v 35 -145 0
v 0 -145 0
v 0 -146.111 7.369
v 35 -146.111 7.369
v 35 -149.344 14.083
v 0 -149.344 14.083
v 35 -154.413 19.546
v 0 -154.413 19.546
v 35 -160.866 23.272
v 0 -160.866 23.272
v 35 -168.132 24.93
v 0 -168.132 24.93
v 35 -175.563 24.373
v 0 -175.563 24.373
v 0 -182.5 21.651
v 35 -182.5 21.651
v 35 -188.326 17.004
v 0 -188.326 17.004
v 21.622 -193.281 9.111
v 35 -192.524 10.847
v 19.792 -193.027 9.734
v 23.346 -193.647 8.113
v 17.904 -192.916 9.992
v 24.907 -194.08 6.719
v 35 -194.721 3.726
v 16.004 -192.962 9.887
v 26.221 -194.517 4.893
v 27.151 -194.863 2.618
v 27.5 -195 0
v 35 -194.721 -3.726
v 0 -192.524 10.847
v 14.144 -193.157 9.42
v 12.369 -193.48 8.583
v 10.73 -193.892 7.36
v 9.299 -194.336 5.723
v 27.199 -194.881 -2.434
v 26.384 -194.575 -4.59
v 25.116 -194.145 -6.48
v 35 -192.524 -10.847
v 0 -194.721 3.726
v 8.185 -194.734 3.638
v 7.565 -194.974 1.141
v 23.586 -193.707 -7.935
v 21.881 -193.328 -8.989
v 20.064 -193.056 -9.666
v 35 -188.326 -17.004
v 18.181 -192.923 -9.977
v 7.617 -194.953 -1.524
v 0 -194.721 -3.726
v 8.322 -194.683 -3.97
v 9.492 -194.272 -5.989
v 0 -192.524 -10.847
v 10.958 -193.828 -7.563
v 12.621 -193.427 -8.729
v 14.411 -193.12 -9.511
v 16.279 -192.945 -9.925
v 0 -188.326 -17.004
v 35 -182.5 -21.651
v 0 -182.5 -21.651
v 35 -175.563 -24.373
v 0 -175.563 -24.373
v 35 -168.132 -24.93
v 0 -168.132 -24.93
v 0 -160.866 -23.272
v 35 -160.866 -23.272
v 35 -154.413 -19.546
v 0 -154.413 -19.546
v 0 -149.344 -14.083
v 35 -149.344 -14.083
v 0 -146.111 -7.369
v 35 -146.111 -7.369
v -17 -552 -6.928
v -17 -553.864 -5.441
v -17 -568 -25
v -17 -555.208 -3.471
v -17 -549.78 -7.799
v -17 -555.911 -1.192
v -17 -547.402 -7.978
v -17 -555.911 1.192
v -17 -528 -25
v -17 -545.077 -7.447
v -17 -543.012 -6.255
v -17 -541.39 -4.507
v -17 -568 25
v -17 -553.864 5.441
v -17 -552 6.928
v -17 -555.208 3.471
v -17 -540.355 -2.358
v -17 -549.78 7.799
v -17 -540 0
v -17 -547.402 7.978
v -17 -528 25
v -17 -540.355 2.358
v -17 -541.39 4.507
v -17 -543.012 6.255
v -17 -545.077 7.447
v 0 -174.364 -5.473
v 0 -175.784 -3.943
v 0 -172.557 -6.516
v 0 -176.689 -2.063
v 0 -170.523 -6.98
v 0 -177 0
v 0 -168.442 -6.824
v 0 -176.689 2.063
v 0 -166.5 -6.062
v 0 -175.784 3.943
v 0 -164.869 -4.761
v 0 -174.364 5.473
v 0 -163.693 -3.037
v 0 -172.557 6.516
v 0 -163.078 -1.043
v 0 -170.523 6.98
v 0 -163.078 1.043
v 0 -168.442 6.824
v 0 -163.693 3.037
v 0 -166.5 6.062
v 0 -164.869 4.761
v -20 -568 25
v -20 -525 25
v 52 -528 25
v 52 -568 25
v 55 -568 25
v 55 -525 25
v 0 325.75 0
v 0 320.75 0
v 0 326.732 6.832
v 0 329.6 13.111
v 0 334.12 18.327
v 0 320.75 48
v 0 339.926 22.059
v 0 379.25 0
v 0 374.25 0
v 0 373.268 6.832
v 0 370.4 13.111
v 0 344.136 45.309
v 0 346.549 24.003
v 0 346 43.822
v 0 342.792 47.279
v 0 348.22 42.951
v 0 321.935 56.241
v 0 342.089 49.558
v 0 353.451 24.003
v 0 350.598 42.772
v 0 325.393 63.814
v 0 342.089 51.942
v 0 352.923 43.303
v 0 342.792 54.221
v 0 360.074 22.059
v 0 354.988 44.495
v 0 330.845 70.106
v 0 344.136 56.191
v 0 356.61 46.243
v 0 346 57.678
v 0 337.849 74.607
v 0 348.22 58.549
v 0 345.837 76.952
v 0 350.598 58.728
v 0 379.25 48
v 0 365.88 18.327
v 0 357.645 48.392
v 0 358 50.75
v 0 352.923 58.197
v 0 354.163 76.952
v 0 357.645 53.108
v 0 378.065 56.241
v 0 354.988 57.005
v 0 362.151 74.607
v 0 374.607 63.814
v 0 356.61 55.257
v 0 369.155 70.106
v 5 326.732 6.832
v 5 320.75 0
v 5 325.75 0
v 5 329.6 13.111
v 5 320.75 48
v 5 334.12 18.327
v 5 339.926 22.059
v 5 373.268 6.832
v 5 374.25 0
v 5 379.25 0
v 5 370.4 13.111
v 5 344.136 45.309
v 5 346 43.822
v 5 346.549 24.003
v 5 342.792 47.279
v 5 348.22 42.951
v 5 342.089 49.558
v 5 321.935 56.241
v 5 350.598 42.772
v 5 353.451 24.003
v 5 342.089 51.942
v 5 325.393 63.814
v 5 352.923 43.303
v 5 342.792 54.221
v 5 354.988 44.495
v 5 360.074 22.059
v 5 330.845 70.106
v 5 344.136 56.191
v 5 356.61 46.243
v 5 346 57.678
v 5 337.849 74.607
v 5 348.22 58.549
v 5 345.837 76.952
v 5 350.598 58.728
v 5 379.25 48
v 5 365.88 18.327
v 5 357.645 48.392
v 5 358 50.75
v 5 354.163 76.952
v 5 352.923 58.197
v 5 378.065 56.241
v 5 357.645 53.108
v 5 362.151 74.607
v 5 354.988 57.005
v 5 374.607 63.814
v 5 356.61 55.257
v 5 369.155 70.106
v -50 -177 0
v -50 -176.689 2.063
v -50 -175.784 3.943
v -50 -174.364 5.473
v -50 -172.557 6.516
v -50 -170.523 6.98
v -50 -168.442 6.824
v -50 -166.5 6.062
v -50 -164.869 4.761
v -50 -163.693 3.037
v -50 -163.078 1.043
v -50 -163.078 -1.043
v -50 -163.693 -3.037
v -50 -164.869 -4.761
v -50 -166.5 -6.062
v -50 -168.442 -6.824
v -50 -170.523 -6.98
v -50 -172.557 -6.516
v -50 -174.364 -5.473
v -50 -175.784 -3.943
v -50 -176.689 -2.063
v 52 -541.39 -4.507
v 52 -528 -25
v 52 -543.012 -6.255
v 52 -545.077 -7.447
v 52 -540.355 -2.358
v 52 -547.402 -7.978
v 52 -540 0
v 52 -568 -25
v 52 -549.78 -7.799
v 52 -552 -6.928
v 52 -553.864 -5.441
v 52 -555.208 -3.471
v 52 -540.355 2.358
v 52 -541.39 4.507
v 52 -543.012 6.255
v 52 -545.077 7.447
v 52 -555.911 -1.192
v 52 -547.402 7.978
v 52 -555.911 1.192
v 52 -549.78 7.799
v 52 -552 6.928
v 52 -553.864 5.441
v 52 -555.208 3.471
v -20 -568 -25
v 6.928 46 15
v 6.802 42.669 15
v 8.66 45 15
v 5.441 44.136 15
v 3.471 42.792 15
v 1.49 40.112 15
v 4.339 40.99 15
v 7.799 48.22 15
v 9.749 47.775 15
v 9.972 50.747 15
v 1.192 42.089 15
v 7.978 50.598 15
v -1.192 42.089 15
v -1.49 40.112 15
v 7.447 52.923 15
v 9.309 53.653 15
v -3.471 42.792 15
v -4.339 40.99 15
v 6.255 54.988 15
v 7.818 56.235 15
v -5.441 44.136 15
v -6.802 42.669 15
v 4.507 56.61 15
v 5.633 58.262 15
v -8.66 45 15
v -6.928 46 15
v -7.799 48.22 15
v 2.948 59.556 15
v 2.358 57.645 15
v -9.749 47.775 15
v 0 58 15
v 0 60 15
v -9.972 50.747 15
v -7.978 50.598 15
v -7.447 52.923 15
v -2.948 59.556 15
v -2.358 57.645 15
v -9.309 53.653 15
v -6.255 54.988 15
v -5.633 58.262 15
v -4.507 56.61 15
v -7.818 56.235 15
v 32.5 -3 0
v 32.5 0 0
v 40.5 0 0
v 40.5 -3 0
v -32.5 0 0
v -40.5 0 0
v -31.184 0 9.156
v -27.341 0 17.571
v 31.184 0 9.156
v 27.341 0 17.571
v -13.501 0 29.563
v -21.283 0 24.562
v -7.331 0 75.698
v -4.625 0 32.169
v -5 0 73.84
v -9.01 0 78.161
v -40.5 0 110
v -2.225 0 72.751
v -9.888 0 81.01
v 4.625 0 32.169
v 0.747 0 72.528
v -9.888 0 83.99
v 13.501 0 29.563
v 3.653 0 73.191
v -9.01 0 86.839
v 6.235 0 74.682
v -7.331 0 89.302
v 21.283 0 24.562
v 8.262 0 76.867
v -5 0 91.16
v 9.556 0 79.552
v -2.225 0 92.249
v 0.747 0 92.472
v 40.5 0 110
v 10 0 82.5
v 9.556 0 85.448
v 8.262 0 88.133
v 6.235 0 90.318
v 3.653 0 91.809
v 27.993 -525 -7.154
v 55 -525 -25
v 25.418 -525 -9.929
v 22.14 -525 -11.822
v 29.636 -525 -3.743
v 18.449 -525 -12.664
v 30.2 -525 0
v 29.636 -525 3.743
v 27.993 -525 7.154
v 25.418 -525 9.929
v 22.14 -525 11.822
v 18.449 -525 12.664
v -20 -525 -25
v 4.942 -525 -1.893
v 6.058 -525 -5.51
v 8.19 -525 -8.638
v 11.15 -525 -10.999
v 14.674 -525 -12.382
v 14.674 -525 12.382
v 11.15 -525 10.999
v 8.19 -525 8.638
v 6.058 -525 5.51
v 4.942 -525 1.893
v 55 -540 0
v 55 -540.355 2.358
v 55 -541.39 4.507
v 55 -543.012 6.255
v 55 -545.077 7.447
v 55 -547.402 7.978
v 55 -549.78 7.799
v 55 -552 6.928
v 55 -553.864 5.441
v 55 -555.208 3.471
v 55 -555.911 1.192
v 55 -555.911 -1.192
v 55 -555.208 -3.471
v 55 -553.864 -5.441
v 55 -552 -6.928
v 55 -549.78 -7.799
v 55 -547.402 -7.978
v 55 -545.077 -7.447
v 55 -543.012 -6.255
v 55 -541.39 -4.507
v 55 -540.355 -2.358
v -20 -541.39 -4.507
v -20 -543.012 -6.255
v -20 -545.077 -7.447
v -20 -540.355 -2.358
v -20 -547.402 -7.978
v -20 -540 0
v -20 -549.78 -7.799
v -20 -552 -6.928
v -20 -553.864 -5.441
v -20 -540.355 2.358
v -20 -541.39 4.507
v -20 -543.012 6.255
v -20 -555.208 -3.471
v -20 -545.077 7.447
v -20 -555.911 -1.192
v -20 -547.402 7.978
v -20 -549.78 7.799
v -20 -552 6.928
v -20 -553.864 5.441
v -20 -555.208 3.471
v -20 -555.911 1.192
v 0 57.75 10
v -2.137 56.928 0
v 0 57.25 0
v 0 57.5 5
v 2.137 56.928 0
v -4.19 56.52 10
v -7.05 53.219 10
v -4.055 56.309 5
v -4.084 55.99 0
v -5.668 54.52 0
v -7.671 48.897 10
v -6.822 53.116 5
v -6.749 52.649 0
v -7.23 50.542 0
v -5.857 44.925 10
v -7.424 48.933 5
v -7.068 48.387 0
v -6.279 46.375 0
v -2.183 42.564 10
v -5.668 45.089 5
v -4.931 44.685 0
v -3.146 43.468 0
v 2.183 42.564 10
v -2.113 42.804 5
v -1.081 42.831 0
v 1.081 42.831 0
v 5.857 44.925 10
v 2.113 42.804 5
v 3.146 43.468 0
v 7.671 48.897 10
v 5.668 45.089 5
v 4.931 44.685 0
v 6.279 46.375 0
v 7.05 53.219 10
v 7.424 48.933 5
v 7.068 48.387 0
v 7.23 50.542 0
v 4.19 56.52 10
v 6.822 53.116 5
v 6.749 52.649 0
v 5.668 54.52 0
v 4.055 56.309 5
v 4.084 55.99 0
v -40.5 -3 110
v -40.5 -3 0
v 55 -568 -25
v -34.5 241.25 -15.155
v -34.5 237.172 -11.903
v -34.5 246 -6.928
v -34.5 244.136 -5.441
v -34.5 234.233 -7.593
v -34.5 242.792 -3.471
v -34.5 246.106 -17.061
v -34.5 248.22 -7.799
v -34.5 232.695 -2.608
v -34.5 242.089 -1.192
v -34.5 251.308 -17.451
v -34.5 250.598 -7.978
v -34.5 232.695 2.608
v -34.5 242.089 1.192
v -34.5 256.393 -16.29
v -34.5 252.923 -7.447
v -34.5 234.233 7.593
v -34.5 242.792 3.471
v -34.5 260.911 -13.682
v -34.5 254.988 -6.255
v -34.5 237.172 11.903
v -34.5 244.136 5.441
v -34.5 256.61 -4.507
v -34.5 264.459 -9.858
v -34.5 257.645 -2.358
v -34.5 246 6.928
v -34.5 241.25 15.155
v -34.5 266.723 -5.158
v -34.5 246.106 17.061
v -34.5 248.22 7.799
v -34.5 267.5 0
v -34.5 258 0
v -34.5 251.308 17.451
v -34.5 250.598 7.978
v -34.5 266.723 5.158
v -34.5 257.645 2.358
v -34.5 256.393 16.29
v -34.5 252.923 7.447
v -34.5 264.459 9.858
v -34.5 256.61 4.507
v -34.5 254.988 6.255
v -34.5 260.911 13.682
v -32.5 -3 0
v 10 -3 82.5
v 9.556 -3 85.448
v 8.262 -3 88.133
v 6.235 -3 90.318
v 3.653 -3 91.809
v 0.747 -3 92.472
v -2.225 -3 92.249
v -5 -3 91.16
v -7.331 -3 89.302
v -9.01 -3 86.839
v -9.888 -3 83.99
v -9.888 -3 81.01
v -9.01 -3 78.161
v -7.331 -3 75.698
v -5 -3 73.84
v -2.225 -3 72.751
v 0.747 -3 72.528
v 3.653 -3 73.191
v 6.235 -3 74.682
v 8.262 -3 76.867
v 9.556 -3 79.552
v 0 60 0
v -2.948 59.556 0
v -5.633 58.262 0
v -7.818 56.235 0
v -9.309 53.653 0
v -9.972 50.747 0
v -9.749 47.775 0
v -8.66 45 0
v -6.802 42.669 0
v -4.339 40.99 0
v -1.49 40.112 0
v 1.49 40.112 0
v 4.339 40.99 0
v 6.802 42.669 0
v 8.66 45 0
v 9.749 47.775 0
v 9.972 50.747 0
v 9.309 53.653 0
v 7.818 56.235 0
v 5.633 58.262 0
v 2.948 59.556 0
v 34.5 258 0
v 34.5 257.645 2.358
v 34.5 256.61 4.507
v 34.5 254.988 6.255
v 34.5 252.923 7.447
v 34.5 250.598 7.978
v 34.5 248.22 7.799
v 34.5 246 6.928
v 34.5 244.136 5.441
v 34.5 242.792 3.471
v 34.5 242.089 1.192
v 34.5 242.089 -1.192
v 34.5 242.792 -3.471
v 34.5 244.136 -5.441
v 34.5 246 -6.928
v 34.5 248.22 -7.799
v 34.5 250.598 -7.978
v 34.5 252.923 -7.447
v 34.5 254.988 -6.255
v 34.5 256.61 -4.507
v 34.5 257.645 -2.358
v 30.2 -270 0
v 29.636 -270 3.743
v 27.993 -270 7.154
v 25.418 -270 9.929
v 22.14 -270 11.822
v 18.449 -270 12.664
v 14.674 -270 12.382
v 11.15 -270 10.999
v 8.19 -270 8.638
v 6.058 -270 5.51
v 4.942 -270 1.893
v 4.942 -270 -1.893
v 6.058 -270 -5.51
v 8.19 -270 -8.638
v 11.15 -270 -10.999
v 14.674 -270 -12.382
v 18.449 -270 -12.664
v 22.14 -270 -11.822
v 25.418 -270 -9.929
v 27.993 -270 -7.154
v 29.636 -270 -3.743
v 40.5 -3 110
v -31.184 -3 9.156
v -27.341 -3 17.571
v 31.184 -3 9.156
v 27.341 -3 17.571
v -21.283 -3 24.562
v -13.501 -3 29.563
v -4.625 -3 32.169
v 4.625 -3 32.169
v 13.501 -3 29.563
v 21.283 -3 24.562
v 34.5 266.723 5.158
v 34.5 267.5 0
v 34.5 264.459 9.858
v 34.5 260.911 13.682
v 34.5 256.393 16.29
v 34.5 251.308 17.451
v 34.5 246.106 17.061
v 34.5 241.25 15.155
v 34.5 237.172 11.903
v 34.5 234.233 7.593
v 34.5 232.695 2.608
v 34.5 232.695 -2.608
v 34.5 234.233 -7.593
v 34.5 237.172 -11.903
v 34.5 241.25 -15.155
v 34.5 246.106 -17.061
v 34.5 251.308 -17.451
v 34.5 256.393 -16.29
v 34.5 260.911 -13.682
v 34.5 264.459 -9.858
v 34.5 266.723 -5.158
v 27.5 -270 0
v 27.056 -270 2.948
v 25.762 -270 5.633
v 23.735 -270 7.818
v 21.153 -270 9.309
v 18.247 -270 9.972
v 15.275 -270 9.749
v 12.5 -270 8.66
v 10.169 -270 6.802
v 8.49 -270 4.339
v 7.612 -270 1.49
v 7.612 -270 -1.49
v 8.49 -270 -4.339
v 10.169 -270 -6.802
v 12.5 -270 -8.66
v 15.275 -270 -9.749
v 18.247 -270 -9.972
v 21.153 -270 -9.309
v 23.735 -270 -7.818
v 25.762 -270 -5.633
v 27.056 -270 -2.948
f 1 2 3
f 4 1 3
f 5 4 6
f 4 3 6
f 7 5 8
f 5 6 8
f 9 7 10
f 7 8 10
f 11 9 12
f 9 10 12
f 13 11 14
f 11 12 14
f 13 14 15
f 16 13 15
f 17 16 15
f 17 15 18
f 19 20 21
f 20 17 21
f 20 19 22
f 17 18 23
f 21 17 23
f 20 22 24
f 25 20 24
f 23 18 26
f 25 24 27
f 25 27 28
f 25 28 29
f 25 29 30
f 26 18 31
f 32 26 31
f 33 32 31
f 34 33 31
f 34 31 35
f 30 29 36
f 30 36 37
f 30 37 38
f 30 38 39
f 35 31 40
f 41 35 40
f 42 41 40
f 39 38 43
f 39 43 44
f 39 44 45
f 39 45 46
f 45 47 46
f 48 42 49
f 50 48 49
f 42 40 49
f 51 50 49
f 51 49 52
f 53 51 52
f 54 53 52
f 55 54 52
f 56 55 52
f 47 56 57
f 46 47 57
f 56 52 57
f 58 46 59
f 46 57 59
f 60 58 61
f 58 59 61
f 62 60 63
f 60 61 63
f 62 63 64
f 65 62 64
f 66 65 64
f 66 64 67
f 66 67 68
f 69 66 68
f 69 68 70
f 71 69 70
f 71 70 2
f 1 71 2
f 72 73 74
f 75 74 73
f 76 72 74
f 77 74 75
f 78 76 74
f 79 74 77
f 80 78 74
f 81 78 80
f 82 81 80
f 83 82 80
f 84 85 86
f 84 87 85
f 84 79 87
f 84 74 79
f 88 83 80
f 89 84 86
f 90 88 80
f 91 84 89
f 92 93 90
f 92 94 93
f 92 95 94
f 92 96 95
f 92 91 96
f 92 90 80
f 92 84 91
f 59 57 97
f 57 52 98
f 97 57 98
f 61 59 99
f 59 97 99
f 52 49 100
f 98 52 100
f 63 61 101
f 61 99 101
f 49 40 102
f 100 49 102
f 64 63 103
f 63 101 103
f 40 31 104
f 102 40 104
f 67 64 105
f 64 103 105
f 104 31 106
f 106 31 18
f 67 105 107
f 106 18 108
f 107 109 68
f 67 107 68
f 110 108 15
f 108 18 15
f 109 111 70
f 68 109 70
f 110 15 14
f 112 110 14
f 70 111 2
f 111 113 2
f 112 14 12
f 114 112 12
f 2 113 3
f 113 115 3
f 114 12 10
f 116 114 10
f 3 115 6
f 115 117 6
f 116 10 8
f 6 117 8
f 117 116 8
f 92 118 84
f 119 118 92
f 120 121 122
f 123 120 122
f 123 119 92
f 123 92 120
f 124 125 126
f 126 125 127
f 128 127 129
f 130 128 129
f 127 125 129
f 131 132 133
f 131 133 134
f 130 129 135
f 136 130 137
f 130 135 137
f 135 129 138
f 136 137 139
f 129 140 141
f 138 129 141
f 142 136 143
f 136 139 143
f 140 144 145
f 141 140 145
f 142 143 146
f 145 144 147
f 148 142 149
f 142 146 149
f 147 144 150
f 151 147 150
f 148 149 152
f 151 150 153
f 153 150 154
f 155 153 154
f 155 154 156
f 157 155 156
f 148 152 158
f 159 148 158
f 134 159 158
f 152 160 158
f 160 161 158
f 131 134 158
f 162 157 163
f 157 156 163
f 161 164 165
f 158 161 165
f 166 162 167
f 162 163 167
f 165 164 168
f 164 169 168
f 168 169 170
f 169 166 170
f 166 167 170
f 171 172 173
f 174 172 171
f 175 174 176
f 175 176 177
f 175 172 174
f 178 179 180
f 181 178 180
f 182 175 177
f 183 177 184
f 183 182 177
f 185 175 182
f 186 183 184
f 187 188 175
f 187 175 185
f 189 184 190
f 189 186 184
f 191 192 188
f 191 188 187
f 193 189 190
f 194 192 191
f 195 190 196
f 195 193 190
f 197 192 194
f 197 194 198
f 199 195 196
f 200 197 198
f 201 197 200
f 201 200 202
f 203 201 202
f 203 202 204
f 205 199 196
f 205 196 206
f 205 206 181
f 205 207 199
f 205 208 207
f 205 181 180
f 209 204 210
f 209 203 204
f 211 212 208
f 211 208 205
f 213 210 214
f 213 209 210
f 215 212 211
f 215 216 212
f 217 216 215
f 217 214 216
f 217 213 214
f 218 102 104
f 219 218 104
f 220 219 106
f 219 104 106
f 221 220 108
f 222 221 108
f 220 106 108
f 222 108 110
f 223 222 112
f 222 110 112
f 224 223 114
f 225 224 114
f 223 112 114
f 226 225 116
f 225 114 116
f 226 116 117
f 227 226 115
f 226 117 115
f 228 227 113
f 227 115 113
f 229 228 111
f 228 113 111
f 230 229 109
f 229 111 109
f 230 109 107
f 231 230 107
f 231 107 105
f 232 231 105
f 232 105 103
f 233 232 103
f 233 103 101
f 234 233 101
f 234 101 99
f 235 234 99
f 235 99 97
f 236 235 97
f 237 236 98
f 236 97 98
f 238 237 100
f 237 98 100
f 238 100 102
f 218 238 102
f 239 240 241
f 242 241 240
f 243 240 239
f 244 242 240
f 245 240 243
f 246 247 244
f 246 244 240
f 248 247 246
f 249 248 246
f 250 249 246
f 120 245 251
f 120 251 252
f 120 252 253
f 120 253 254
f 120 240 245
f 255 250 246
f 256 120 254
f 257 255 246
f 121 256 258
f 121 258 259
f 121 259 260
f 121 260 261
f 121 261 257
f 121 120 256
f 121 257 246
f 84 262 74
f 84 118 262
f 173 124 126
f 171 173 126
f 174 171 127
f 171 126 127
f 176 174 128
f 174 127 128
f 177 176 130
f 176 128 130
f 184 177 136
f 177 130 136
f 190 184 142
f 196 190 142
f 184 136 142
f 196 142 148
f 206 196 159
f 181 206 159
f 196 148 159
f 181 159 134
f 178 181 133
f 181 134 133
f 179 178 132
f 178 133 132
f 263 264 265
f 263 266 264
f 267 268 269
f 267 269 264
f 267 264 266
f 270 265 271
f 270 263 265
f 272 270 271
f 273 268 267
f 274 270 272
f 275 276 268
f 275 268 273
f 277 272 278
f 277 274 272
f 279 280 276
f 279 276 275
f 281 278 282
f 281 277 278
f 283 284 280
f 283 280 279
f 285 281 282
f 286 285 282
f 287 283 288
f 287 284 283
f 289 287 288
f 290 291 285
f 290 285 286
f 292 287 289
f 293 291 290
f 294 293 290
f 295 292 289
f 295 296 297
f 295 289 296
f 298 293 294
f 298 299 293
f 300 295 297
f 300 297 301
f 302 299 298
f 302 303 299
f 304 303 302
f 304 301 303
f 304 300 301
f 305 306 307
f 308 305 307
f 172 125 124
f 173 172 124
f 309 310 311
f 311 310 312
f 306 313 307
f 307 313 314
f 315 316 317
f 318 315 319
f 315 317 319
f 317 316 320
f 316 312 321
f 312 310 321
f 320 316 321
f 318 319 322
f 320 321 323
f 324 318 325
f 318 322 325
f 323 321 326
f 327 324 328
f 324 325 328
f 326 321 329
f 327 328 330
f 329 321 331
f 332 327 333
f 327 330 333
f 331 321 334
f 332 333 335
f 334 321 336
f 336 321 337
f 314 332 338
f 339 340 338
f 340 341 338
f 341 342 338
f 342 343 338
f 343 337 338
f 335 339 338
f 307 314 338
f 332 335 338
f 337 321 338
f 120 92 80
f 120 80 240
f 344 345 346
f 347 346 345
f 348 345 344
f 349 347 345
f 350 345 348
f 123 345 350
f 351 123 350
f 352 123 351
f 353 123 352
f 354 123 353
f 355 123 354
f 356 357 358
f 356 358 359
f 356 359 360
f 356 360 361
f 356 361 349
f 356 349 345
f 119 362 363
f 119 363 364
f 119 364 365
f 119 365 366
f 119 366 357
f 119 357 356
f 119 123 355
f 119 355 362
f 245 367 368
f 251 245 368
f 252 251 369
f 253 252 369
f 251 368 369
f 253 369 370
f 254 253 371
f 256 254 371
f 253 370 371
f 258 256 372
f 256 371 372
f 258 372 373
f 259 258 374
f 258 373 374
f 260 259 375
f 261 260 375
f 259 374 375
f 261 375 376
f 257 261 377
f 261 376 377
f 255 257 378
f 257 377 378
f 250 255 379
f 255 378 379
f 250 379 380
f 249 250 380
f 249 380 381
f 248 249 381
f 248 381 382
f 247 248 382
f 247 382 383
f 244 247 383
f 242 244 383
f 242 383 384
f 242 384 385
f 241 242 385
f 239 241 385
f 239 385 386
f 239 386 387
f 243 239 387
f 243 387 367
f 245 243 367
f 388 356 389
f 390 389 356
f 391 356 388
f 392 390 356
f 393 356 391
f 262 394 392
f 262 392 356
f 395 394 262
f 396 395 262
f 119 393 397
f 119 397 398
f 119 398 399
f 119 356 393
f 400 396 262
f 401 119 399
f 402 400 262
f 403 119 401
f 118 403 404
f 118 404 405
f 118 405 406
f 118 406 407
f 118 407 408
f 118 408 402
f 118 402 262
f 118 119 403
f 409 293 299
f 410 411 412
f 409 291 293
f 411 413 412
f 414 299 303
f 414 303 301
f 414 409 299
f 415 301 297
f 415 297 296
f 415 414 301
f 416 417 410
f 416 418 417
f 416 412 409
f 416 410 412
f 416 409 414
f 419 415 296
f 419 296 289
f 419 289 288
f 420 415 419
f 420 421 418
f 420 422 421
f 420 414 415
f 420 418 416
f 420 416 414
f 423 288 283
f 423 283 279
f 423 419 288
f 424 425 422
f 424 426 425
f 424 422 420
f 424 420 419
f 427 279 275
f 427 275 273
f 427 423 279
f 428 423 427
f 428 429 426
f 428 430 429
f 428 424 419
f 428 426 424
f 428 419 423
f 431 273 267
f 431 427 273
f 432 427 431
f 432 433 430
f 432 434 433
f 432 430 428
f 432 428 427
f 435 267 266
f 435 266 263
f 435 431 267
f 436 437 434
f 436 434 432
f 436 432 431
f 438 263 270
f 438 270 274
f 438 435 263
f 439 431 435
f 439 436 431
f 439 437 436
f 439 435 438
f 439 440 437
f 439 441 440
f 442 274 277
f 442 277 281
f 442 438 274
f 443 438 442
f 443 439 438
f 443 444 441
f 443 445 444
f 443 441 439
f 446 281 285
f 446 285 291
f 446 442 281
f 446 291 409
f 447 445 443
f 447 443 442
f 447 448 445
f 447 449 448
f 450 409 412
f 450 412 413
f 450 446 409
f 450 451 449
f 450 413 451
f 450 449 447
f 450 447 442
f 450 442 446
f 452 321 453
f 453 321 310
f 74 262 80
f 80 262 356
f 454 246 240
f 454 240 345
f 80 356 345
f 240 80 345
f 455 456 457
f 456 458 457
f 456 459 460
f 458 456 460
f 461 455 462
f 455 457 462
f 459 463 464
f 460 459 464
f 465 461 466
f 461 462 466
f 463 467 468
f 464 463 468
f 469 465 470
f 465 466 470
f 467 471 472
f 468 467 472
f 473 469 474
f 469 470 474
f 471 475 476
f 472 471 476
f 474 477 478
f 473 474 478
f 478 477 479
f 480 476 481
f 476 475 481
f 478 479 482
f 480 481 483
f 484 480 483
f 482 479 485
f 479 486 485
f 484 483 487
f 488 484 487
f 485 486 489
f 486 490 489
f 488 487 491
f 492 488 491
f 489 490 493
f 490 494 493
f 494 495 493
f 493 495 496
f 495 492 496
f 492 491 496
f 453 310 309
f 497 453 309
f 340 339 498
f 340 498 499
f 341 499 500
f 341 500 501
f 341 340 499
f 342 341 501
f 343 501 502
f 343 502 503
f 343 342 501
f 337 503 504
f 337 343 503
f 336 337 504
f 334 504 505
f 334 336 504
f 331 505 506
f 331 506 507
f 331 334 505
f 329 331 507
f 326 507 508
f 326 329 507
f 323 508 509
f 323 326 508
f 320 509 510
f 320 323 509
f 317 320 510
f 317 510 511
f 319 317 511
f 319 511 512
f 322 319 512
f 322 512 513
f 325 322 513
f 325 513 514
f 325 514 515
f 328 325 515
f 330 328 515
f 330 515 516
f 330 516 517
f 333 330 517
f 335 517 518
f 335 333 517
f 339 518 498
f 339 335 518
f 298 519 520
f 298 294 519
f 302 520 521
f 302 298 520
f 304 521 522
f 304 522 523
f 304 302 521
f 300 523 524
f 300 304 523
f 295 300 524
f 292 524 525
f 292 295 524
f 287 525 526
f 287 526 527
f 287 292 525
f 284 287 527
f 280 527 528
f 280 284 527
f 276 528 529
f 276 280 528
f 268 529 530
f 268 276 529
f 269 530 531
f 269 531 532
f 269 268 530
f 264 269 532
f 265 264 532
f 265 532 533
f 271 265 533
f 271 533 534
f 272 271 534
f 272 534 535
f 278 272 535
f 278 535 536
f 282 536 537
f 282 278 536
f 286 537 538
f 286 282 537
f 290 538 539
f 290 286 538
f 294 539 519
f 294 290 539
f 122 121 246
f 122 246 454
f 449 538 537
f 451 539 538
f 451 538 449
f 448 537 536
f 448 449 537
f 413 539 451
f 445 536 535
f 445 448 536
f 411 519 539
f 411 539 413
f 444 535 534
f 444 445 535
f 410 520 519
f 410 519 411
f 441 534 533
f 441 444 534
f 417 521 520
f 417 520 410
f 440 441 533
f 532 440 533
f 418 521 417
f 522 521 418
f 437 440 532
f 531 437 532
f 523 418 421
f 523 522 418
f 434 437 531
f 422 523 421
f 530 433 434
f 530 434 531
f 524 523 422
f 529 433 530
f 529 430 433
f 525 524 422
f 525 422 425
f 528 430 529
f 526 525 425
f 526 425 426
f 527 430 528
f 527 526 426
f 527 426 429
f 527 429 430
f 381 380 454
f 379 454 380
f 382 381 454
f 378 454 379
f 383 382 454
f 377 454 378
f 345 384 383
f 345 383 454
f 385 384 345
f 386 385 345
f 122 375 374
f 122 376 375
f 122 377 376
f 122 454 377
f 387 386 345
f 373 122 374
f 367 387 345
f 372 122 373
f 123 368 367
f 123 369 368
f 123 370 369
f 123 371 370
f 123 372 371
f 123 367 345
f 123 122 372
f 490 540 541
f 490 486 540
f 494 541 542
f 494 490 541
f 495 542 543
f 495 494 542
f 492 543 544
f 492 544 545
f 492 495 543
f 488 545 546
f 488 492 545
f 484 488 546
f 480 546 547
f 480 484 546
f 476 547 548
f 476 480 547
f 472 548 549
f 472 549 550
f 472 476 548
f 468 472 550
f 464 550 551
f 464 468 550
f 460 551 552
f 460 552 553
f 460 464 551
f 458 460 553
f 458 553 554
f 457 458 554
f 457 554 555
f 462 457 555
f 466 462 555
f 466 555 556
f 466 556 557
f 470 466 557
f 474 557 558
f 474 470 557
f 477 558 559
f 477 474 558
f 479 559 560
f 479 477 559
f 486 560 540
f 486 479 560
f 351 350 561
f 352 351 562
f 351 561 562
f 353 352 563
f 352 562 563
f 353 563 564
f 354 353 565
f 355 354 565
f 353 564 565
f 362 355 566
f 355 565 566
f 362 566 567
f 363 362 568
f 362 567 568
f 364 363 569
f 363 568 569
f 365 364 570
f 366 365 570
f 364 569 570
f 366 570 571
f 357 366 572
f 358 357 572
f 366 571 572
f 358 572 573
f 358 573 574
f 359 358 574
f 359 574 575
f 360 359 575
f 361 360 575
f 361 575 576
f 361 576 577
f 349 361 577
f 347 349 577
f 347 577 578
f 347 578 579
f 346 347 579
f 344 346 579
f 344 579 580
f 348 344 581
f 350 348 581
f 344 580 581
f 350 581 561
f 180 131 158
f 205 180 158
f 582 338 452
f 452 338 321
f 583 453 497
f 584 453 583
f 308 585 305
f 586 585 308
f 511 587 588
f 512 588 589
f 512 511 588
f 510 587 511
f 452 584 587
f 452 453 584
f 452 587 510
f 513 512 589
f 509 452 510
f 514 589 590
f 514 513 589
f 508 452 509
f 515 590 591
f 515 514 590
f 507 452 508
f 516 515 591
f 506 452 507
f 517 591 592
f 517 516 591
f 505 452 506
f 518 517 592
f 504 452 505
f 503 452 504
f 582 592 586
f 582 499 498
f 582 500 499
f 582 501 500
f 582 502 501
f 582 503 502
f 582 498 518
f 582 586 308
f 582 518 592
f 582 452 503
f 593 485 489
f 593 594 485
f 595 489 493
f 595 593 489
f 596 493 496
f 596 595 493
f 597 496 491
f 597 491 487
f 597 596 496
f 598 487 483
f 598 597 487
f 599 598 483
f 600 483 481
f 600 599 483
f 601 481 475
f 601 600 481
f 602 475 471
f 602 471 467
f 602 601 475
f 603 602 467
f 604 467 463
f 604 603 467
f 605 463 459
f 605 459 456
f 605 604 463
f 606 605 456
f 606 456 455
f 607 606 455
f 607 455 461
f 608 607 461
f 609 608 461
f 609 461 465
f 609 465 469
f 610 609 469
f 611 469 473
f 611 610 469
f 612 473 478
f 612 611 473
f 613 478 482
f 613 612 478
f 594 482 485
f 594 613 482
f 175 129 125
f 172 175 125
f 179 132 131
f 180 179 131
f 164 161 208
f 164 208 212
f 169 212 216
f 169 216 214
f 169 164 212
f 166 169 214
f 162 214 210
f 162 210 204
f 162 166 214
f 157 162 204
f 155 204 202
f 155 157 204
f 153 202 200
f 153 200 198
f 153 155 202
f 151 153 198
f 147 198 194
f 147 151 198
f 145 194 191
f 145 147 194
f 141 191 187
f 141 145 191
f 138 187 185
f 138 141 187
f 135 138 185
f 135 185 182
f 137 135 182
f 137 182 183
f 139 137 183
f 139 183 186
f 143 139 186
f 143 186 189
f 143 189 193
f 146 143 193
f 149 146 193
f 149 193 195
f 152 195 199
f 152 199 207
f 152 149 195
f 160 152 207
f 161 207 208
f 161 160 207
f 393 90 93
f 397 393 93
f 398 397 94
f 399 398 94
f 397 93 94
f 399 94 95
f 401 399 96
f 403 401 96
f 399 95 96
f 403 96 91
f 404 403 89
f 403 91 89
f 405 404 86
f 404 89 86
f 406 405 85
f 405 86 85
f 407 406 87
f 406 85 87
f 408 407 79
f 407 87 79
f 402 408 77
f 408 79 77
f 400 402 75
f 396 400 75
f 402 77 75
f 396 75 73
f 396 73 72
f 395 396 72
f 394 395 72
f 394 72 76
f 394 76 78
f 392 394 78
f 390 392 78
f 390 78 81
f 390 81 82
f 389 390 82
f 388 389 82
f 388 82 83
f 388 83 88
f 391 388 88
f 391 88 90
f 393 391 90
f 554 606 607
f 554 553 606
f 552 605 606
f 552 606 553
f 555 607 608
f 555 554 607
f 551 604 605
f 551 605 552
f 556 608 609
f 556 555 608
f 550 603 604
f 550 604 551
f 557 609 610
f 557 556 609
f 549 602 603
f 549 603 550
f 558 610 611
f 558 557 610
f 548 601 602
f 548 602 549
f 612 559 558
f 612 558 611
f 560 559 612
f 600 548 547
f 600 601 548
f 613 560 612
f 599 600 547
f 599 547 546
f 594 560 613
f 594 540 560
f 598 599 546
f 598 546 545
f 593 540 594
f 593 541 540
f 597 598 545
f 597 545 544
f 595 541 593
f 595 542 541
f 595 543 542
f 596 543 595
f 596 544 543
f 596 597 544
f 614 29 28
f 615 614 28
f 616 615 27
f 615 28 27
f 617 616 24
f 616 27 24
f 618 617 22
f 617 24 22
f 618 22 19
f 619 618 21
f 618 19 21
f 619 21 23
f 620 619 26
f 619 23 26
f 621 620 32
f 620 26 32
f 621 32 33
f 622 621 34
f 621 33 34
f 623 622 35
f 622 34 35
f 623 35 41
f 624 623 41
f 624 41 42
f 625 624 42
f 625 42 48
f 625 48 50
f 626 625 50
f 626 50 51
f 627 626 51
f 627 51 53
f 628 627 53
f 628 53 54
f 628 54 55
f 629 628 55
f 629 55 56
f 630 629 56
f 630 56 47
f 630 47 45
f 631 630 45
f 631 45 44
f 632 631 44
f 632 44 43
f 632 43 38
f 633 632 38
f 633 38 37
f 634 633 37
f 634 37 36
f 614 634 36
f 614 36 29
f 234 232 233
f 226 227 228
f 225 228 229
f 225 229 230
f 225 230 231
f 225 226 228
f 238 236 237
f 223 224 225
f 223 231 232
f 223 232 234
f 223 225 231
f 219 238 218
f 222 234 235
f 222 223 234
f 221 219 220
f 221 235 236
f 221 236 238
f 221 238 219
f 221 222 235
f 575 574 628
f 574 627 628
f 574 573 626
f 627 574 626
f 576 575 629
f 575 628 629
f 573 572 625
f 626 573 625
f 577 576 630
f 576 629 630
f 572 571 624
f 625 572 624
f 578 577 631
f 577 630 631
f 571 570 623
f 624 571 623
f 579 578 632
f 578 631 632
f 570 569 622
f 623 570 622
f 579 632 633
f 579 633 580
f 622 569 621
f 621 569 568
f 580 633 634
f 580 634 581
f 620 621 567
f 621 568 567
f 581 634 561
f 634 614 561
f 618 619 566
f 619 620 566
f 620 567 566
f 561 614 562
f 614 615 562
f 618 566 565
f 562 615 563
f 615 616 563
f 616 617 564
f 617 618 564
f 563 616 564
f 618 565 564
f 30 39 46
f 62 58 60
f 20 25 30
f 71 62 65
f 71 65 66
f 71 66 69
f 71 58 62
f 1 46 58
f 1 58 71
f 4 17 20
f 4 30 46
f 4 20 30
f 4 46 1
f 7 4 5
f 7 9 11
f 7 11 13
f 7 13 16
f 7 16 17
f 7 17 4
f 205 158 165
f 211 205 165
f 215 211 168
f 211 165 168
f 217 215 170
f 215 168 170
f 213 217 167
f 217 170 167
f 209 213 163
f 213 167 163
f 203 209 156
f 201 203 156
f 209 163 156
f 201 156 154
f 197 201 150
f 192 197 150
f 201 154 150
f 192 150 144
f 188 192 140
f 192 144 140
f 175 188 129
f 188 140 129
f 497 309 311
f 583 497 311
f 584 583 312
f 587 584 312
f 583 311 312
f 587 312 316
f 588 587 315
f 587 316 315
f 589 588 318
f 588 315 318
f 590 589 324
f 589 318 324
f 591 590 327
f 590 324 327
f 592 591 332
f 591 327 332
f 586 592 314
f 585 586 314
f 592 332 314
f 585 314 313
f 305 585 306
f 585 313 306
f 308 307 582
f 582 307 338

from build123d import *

# Parameters (mm, degrees)
F0_R      = 10
F1_DEPTH  = 3
F2_R      = 25
F3_DEPTH  = 35
F4_R      = 7
F5_DEPTH  = 50
F7_R      = 10
F8_DEPTH  = 100
F9_R      = 12.7
F10_DEPTH = 255
F12_DEPTH = 25
F13_R     = 8
F14_DEPTH = 82.4
F15_R     = 17.5
F15_R_2   = 8
F16_DEPTH = 34.5
F17_R     = 8
F18_DEPTH = 5


with BuildPart() as f1:
    # F0 (on Front) → F1 (new body)
    with BuildSketch(Plane.XZ):
        with BuildLine():
            ThreePointArc((-32.5, 0), (0, 32.5), (32.5, 0))
            Line((32.5, 0), (40.5, 0))
            Line((40.5, 0), (40.5, 110))
            Line((40.5, 110), (-40.5, 110))
            Line((-40.5, 110), (-40.5, 0))
            Line((-40.5, 0), (-32.5, 0))
        make_face()
        with Locations((0, 82.5)):
            Circle(F0_R, mode=Mode.SUBTRACT)
    extrude(amount=F1_DEPTH)


with BuildPart() as f3:
    # F2 (on Right) → F3 (new body)
    with BuildSketch(Plane.YZ):
        with Locations((-170, 0)):
            Circle(F2_R)
    extrude(amount=F3_DEPTH)

    # F4 (on face) → F5 (join)
    with BuildSketch(Plane(origin=(0, 0, 0), x_dir=(0, -1, 0), z_dir=(-1, 0, 0))):
        with Locations((170, 0)):
            Circle(F4_R)
    extrude(amount=F5_DEPTH)

    # F7 (on offset) → F8 (join)
    with BuildSketch(Plane.XZ.offset(170)):
        with Locations((17.5, 0)):
            Circle(F7_R)
    extrude(amount=F8_DEPTH)

    # F9 (on face) → F10 (join)
    with BuildSketch(Plane.XZ.offset(270)):
        with Locations((17.5, 0)):
            Circle(F9_R)
    extrude(amount=F10_DEPTH)

    # F11 (on Top) → F12 (join, symmetric)
    with BuildSketch(Plane.XY):
        Polygon((-17, -568), (-17, -528), (52, -528), (52, -568), (55, -568), (55, -525), (-20, -525), (-20, -568), align=None)
    extrude(amount=F12_DEPTH, both=True)

    # F13 (on face) → F14 (cut)
    with BuildSketch(Plane.YZ.offset(55)):
        with Locations((-548, 0)):
            Circle(F13_R)
    extrude(amount=-F14_DEPTH, mode=Mode.SUBTRACT)


with BuildPart() as f16:
    # F15 (on Right) → F16 (new body, symmetric)
    with BuildSketch(Plane.YZ):
        with Locations((250, 0)):
            Circle(F15_R)
        with Locations((250, 0)):
            Circle(F15_R_2, mode=Mode.SUBTRACT)
    extrude(amount=F16_DEPTH, both=True)


with BuildPart() as f18:
    # F17 (on Right) → F18 (new body)
    with BuildSketch(Plane.YZ):
        with BuildLine():
            ThreePointArc((325.75, 0), (350, 24.25), (374.25, 0))
            Line((374.25, 0), (379.25, 0))
            Line((379.25, 0), (379.25, 48))
            ThreePointArc((379.25, 48), (350, 77.25), (320.75, 48))
            Line((320.75, 48), (320.75, 0))
            Line((320.75, 0), (325.75, 0))
        make_face()
        with Locations((350, 50.75)):
            Circle(F17_R, mode=Mode.SUBTRACT)
    extrude(amount=F18_DEPTH)


with BuildPart() as f20:
    # F19 (on Right) → F20 (revolve)
    with BuildSketch(Plane.YZ):
        Polygon((60, 15), (58, 15), (57.25, 0), (60, 0), align=None)
    revolve(axis=Axis((0, 50, 43.373331), (0, 0, 1)))


solid = Compound([f1.part, f3.part, f16.part, f18.part, f20.part])
